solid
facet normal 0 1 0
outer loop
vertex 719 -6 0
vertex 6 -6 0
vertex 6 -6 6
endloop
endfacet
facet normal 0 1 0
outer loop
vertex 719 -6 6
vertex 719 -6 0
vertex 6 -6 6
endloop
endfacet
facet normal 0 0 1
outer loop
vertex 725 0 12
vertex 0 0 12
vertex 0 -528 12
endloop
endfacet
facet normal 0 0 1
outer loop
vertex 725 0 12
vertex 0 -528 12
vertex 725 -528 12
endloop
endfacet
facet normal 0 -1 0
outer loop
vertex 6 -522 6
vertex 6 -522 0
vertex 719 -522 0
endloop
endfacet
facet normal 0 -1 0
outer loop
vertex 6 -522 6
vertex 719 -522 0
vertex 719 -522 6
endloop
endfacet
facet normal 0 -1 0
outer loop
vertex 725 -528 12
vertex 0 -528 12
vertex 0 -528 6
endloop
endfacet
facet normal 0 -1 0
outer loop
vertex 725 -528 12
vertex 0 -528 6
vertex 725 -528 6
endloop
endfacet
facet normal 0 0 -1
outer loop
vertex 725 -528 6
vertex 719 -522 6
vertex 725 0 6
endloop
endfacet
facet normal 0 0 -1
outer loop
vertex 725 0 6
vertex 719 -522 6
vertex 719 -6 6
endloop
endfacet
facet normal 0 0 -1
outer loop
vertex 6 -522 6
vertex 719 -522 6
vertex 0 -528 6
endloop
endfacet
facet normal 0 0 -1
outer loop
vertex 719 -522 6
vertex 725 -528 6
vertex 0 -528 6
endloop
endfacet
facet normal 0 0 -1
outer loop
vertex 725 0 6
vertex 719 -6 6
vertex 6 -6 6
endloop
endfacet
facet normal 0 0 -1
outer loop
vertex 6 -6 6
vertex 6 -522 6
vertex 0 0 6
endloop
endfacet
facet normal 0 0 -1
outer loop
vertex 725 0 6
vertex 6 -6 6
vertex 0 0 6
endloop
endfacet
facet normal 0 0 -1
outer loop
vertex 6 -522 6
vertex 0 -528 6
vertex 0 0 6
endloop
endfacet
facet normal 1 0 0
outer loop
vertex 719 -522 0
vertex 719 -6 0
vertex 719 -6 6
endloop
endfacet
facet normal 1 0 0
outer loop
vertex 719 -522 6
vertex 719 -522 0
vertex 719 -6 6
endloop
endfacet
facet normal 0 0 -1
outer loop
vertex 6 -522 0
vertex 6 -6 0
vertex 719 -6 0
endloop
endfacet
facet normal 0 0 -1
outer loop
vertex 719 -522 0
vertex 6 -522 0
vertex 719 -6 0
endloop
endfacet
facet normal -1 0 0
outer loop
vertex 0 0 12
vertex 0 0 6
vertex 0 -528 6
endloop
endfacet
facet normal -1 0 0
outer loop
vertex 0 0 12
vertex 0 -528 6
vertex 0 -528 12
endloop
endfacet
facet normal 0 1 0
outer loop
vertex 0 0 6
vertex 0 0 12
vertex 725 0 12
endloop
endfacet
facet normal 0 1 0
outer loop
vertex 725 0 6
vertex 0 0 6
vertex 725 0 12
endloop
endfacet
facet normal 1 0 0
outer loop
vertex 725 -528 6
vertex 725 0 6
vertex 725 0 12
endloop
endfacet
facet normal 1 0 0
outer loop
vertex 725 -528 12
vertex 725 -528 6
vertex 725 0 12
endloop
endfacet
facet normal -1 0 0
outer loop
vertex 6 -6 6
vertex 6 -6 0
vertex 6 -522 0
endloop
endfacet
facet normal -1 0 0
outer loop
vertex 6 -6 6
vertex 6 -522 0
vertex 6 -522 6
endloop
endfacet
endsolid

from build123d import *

# Parameters (mm, degrees)
F0_W     = 725
F0_H     = 12
F1_DEPTH = 528
F2_W     = 6
F2_H     = 6
F3_DEPTH = 725.001
F4_W     = 6
F4_H     = 6
F5_DEPTH = 528.001


with BuildPart() as f1:
    # F0 (on Front) → F1 (new body)
    with BuildSketch(Plane.XZ):
        with Locations((362.5, 6)):
            Rectangle(F0_W, F0_H)
    extrude(amount=F1_DEPTH)

    # F2 (on Right) → F3 (cut, through all)
    with BuildSketch(Plane.YZ):
        with Locations((-525, 3)):
            Rectangle(F2_W, F2_H)
        with Locations((-3, 3)):
            Rectangle(F2_W, F2_H)
    extrude(amount=F3_DEPTH, mode=Mode.SUBTRACT)

    # F4 (on Front) → F5 (cut, through all)
    with BuildSketch(Plane.XZ):
        with Locations((3, 3)):
            Rectangle(F4_W, F4_H)
        with Locations((722, 3)):
            Rectangle(F4_W, F4_H)
    extrude(amount=F5_DEPTH, mode=Mode.SUBTRACT)


solid = f1.part
